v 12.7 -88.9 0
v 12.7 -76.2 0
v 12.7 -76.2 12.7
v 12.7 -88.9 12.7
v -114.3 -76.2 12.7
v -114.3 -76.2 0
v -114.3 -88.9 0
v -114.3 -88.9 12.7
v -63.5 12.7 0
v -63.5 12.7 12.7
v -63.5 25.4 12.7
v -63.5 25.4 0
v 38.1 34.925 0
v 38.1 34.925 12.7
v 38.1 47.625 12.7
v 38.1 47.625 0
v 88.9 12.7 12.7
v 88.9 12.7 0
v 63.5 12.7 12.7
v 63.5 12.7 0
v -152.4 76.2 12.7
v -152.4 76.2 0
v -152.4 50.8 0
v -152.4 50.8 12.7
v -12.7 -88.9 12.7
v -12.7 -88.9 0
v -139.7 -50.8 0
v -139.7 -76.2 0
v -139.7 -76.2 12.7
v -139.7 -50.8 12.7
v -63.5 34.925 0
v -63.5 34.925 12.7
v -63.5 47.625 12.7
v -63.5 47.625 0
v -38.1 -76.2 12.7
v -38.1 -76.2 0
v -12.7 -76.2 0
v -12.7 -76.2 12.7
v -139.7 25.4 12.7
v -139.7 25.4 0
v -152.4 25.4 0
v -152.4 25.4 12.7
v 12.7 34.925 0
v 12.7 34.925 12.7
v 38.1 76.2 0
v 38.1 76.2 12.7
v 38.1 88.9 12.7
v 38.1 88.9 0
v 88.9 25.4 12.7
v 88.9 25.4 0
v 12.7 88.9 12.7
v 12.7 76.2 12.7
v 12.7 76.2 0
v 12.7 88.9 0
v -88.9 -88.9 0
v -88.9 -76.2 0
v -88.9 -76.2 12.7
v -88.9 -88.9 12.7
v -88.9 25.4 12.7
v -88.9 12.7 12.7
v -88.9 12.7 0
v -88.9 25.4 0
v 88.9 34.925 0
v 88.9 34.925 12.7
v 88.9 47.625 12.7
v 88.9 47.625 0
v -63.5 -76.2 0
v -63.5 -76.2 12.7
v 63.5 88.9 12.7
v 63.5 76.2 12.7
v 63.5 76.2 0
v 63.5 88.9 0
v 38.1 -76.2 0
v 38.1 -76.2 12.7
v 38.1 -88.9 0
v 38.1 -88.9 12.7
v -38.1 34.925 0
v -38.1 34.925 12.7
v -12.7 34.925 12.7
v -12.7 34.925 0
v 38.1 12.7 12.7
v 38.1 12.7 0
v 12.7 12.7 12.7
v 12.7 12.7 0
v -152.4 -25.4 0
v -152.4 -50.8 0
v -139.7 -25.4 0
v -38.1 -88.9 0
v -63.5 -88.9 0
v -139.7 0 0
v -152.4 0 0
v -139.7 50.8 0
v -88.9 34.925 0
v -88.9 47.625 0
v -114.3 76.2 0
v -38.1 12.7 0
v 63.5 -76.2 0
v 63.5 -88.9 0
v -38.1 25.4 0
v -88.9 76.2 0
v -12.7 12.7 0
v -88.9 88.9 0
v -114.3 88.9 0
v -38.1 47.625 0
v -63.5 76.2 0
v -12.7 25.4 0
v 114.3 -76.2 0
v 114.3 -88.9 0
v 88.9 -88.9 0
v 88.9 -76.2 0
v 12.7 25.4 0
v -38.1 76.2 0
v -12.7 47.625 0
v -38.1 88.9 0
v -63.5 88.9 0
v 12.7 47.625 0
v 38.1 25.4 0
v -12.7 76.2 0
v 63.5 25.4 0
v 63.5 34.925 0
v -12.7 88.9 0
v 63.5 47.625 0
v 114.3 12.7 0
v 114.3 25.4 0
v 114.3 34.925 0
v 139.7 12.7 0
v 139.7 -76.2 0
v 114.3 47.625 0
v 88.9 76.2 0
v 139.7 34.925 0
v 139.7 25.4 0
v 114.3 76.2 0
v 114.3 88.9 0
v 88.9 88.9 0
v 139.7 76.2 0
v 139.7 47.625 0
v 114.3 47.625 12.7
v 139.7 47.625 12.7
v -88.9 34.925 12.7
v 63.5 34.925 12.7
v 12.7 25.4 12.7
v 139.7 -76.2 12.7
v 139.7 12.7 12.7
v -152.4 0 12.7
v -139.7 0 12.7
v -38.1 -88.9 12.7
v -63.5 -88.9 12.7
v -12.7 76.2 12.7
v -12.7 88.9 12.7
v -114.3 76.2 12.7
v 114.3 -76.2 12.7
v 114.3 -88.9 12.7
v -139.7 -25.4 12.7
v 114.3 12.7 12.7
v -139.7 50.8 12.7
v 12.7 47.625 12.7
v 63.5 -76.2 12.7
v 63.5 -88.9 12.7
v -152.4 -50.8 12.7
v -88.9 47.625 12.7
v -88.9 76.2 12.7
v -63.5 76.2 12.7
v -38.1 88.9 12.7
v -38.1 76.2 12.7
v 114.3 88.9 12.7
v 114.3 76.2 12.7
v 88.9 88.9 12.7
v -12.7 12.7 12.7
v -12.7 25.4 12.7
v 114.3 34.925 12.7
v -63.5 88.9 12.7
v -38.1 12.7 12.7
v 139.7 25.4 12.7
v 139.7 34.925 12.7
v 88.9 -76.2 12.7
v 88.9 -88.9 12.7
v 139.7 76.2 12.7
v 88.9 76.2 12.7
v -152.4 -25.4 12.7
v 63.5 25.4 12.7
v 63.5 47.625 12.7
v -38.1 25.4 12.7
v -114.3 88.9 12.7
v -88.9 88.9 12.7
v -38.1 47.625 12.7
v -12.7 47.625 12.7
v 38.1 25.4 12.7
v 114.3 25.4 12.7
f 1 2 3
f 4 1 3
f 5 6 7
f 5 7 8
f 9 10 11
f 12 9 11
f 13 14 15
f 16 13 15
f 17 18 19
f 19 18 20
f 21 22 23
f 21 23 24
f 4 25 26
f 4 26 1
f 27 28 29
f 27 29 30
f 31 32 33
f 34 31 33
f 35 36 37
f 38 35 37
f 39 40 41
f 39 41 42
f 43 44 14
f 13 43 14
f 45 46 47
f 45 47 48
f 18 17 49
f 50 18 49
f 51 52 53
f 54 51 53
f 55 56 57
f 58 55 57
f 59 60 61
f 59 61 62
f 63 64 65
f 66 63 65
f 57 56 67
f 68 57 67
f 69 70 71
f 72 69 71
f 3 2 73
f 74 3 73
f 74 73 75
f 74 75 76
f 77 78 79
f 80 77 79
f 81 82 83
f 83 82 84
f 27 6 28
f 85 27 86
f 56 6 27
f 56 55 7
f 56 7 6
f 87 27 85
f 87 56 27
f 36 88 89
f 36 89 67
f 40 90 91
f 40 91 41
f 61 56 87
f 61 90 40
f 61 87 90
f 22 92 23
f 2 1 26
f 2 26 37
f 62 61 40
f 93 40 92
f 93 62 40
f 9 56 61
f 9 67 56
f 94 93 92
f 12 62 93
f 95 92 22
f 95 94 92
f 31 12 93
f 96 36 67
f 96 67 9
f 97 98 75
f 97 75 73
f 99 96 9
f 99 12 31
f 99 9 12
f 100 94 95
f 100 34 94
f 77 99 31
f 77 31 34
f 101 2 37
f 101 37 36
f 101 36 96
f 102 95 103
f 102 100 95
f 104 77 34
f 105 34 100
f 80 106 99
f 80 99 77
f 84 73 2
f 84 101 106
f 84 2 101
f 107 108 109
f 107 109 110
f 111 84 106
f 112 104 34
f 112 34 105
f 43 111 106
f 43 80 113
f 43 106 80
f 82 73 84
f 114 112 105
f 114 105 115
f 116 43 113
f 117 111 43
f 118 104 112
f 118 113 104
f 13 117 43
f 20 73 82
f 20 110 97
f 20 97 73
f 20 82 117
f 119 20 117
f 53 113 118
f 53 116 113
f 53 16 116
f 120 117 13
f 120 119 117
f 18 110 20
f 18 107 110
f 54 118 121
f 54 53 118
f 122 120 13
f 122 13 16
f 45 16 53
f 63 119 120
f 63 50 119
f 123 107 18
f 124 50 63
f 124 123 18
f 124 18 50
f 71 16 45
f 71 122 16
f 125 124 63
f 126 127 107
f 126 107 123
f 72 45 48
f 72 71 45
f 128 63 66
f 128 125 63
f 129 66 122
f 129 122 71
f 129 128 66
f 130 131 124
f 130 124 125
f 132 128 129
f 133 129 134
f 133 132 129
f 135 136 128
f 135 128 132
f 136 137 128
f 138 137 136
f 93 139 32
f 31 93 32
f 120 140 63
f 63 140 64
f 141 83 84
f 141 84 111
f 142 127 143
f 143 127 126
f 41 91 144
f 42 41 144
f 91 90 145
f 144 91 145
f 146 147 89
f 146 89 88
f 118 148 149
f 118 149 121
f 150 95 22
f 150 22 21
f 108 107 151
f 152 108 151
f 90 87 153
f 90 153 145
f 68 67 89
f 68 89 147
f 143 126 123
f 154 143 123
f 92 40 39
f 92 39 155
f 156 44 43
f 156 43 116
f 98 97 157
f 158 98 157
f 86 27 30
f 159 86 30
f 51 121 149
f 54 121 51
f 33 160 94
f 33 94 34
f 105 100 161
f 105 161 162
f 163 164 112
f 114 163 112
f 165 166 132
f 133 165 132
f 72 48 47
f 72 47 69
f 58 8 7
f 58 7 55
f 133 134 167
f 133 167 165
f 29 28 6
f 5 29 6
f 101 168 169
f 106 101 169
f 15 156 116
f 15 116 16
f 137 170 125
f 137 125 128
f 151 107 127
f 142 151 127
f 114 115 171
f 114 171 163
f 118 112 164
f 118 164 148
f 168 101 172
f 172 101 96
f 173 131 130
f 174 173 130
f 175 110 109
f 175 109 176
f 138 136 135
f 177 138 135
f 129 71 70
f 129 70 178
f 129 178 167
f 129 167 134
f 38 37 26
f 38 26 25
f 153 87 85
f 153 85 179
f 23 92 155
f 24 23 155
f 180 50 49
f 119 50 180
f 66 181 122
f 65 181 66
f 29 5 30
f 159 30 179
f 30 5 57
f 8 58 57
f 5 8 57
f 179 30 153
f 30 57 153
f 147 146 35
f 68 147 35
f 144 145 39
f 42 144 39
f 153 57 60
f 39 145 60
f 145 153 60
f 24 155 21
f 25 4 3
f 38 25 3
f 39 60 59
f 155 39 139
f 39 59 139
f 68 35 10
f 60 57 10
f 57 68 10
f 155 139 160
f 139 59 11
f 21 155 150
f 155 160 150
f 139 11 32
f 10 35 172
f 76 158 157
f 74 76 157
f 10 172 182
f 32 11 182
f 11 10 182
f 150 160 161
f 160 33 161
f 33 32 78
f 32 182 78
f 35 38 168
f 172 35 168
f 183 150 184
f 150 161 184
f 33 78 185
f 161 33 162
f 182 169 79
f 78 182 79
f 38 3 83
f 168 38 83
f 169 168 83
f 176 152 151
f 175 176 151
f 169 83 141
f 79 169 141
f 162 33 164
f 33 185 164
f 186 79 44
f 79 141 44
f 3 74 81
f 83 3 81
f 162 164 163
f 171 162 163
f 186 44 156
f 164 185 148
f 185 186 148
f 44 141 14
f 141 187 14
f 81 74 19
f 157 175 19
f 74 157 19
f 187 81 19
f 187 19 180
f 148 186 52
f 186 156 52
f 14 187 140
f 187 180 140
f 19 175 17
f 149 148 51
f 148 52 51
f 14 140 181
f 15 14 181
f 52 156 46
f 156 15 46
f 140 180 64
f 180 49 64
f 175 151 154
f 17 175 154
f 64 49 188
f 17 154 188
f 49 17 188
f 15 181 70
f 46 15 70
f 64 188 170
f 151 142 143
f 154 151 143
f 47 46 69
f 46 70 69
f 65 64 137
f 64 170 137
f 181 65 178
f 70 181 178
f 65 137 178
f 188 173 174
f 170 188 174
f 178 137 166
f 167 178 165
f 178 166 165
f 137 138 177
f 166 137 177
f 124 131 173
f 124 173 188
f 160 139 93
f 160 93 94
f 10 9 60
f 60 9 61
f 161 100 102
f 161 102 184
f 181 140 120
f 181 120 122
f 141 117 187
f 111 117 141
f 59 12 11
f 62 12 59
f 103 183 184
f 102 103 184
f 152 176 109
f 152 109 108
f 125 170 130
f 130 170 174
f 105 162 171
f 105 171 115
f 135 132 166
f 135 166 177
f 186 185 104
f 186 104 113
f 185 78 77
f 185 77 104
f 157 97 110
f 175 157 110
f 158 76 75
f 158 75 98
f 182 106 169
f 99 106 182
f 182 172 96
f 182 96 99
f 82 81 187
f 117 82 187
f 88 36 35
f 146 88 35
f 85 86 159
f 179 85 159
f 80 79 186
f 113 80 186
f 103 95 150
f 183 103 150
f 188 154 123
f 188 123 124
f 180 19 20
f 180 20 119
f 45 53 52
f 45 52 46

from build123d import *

# Parameters (mm, degrees)
SKETCH1_W               = 279.4
SKETCH1_H               = 152.4
BOSS_EXTRUDE1_DEPTH     = 12.7
SKETCH2_W               = 25.4
SKETCH2_H               = 12.7
BOSS_EXTRUDE2_DEPTH     = 12.7
LPATTERN1_COUNT         = 5
LPATTERN1_PITCH         = 50.8
MIRROR1_COPY_1_SKETCH_W = 25.4
MIRROR1_COPY_1_SKETCH_H = 12.7
MIRROR1_COPY_1_DEPTH    = 12.7
MIRROR1_COPY_2_SKETCH_W = 25.4
MIRROR1_COPY_2_SKETCH_H = 12.7
MIRROR1_COPY_2_DEPTH    = 12.7
MIRROR1_COPY_3_SKETCH_W = 25.4
MIRROR1_COPY_3_SKETCH_H = 12.7
MIRROR1_COPY_3_DEPTH    = 12.7
MIRROR1_COPY_4_SKETCH_W = 25.4
MIRROR1_COPY_4_SKETCH_H = 12.7
MIRROR1_COPY_4_DEPTH    = 12.7
SKETCH3_W               = 12.7
SKETCH3_H               = 25.4
BOSS_EXTRUDE3_DEPTH     = 12.7
LPATTERN2_COUNT         = 3
LPATTERN2_PITCH         = 50.8
SKETCH4_W               = 25.4
SKETCH4_H               = 12.7
CUT_EXTRUDE1_DEPTH      = 13.7
LPATTERN3_COUNT         = 5
LPATTERN3_PITCH         = 50.8
SKETCH5_W               = 25.4
SKETCH5_H               = 12.7
CUT_EXTRUDE2_DEPTH      = 13.7
LPATTERN4_COUNT         = 5
LPATTERN4_PITCH         = 50.8


with BuildPart() as part:
    # Sketch1 → Boss-Extrude1 (new body)
    with BuildSketch(Plane.XY):
        Rectangle(SKETCH1_W, SKETCH1_H)
    extrude(amount=BOSS_EXTRUDE1_DEPTH)

    # Sketch2 → Boss-Extrude2 (add)
    with BuildSketch(Plane.XZ.offset(76.2)):
        with Locations((-101.6, 6.35)):
            Rectangle(SKETCH2_W, SKETCH2_H)
    boss_extrude2 = extrude(amount=BOSS_EXTRUDE2_DEPTH)

    # LPattern1: Boss-Extrude2 ×5
    with Locations(*[(i * LPATTERN1_PITCH, 0, 0) for i in range(1, LPATTERN1_COUNT)]):
        add(boss_extrude2)

    # Mirror1: Boss-Extrude2 across plane
    add(boss_extrude2.mirror(Plane.ZX))

    # Mirror1 copy 1 sketch → Mirror1 copy 1 (add)
    with BuildSketch(Plane(origin=(50.8, 76.2, 0), x_dir=(1, 0, 0), z_dir=(0, 1, 0))):
        with Locations((-101.6, -6.35)):
            Rectangle(MIRROR1_COPY_1_SKETCH_W, MIRROR1_COPY_1_SKETCH_H)
    extrude(amount=MIRROR1_COPY_1_DEPTH)

    # Mirror1 copy 2 sketch → Mirror1 copy 2 (add)
    with BuildSketch(Plane(origin=(101.6, 76.2, 0), x_dir=(1, 0, 0), z_dir=(0, 1, 0))):
        with Locations((-101.6, -6.35)):
            Rectangle(MIRROR1_COPY_2_SKETCH_W, MIRROR1_COPY_2_SKETCH_H)
    extrude(amount=MIRROR1_COPY_2_DEPTH)

    # Mirror1 copy 3 sketch → Mirror1 copy 3 (add)
    with BuildSketch(Plane(origin=(152.4, 76.2, 0), x_dir=(1, 0, 0), z_dir=(0, 1, 0))):
        with Locations((-101.6, -6.35)):
            Rectangle(MIRROR1_COPY_3_SKETCH_W, MIRROR1_COPY_3_SKETCH_H)
    extrude(amount=MIRROR1_COPY_3_DEPTH)

    # Mirror1 copy 4 sketch → Mirror1 copy 4 (add)
    with BuildSketch(Plane(origin=(203.2, 76.2, 0), x_dir=(1, 0, 0), z_dir=(0, 1, 0))):
        with Locations((-101.6, -6.35)):
            Rectangle(MIRROR1_COPY_4_SKETCH_W, MIRROR1_COPY_4_SKETCH_H)
    extrude(amount=MIRROR1_COPY_4_DEPTH)

    # Sketch3 → Boss-Extrude3 (add)
    with BuildSketch(Plane.ZY.offset(139.7)):
        with Locations((6.35, 63.5)):
            Rectangle(SKETCH3_W, SKETCH3_H)
    boss_extrude3 = extrude(amount=BOSS_EXTRUDE3_DEPTH)

    # LPattern2: Boss-Extrude3 ×3
    with Locations(*[(0, -i * LPATTERN2_PITCH, 0) for i in range(1, LPATTERN2_COUNT)]):
        add(boss_extrude3)

    # Sketch4 → Cut-Extrude1 (cut, through all)
    with BuildSketch(Plane(origin=(0, 0, 0), x_dir=(-1, 0, 0), z_dir=(0, 0, -1))):
        with Locations((-127, 19.05)):
            Rectangle(SKETCH4_W, SKETCH4_H)
    cut_extrude1 = extrude(amount=-CUT_EXTRUDE1_DEPTH, mode=Mode.SUBTRACT)

    # LPattern3: Cut-Extrude1 ×5
    with Locations(*[(-i * LPATTERN3_PITCH, 0, 0) for i in range(1, LPATTERN3_COUNT)]):
        add(cut_extrude1, mode=Mode.SUBTRACT)

    # Sketch5 → Cut-Extrude2 (cut, through all)
    with BuildSketch(Plane.XY.offset(12.7)):
        with Locations((-76.2, 41.275)):
            Rectangle(SKETCH5_W, SKETCH5_H)
    cut_extrude2 = extrude(amount=-CUT_EXTRUDE2_DEPTH, mode=Mode.SUBTRACT)

    # LPattern4: Cut-Extrude2 ×5
    with Locations(*[(i * LPATTERN4_PITCH, 0, 0) for i in range(1, LPATTERN4_COUNT)]):
        add(cut_extrude2, mode=Mode.SUBTRACT)


solid = part.part
